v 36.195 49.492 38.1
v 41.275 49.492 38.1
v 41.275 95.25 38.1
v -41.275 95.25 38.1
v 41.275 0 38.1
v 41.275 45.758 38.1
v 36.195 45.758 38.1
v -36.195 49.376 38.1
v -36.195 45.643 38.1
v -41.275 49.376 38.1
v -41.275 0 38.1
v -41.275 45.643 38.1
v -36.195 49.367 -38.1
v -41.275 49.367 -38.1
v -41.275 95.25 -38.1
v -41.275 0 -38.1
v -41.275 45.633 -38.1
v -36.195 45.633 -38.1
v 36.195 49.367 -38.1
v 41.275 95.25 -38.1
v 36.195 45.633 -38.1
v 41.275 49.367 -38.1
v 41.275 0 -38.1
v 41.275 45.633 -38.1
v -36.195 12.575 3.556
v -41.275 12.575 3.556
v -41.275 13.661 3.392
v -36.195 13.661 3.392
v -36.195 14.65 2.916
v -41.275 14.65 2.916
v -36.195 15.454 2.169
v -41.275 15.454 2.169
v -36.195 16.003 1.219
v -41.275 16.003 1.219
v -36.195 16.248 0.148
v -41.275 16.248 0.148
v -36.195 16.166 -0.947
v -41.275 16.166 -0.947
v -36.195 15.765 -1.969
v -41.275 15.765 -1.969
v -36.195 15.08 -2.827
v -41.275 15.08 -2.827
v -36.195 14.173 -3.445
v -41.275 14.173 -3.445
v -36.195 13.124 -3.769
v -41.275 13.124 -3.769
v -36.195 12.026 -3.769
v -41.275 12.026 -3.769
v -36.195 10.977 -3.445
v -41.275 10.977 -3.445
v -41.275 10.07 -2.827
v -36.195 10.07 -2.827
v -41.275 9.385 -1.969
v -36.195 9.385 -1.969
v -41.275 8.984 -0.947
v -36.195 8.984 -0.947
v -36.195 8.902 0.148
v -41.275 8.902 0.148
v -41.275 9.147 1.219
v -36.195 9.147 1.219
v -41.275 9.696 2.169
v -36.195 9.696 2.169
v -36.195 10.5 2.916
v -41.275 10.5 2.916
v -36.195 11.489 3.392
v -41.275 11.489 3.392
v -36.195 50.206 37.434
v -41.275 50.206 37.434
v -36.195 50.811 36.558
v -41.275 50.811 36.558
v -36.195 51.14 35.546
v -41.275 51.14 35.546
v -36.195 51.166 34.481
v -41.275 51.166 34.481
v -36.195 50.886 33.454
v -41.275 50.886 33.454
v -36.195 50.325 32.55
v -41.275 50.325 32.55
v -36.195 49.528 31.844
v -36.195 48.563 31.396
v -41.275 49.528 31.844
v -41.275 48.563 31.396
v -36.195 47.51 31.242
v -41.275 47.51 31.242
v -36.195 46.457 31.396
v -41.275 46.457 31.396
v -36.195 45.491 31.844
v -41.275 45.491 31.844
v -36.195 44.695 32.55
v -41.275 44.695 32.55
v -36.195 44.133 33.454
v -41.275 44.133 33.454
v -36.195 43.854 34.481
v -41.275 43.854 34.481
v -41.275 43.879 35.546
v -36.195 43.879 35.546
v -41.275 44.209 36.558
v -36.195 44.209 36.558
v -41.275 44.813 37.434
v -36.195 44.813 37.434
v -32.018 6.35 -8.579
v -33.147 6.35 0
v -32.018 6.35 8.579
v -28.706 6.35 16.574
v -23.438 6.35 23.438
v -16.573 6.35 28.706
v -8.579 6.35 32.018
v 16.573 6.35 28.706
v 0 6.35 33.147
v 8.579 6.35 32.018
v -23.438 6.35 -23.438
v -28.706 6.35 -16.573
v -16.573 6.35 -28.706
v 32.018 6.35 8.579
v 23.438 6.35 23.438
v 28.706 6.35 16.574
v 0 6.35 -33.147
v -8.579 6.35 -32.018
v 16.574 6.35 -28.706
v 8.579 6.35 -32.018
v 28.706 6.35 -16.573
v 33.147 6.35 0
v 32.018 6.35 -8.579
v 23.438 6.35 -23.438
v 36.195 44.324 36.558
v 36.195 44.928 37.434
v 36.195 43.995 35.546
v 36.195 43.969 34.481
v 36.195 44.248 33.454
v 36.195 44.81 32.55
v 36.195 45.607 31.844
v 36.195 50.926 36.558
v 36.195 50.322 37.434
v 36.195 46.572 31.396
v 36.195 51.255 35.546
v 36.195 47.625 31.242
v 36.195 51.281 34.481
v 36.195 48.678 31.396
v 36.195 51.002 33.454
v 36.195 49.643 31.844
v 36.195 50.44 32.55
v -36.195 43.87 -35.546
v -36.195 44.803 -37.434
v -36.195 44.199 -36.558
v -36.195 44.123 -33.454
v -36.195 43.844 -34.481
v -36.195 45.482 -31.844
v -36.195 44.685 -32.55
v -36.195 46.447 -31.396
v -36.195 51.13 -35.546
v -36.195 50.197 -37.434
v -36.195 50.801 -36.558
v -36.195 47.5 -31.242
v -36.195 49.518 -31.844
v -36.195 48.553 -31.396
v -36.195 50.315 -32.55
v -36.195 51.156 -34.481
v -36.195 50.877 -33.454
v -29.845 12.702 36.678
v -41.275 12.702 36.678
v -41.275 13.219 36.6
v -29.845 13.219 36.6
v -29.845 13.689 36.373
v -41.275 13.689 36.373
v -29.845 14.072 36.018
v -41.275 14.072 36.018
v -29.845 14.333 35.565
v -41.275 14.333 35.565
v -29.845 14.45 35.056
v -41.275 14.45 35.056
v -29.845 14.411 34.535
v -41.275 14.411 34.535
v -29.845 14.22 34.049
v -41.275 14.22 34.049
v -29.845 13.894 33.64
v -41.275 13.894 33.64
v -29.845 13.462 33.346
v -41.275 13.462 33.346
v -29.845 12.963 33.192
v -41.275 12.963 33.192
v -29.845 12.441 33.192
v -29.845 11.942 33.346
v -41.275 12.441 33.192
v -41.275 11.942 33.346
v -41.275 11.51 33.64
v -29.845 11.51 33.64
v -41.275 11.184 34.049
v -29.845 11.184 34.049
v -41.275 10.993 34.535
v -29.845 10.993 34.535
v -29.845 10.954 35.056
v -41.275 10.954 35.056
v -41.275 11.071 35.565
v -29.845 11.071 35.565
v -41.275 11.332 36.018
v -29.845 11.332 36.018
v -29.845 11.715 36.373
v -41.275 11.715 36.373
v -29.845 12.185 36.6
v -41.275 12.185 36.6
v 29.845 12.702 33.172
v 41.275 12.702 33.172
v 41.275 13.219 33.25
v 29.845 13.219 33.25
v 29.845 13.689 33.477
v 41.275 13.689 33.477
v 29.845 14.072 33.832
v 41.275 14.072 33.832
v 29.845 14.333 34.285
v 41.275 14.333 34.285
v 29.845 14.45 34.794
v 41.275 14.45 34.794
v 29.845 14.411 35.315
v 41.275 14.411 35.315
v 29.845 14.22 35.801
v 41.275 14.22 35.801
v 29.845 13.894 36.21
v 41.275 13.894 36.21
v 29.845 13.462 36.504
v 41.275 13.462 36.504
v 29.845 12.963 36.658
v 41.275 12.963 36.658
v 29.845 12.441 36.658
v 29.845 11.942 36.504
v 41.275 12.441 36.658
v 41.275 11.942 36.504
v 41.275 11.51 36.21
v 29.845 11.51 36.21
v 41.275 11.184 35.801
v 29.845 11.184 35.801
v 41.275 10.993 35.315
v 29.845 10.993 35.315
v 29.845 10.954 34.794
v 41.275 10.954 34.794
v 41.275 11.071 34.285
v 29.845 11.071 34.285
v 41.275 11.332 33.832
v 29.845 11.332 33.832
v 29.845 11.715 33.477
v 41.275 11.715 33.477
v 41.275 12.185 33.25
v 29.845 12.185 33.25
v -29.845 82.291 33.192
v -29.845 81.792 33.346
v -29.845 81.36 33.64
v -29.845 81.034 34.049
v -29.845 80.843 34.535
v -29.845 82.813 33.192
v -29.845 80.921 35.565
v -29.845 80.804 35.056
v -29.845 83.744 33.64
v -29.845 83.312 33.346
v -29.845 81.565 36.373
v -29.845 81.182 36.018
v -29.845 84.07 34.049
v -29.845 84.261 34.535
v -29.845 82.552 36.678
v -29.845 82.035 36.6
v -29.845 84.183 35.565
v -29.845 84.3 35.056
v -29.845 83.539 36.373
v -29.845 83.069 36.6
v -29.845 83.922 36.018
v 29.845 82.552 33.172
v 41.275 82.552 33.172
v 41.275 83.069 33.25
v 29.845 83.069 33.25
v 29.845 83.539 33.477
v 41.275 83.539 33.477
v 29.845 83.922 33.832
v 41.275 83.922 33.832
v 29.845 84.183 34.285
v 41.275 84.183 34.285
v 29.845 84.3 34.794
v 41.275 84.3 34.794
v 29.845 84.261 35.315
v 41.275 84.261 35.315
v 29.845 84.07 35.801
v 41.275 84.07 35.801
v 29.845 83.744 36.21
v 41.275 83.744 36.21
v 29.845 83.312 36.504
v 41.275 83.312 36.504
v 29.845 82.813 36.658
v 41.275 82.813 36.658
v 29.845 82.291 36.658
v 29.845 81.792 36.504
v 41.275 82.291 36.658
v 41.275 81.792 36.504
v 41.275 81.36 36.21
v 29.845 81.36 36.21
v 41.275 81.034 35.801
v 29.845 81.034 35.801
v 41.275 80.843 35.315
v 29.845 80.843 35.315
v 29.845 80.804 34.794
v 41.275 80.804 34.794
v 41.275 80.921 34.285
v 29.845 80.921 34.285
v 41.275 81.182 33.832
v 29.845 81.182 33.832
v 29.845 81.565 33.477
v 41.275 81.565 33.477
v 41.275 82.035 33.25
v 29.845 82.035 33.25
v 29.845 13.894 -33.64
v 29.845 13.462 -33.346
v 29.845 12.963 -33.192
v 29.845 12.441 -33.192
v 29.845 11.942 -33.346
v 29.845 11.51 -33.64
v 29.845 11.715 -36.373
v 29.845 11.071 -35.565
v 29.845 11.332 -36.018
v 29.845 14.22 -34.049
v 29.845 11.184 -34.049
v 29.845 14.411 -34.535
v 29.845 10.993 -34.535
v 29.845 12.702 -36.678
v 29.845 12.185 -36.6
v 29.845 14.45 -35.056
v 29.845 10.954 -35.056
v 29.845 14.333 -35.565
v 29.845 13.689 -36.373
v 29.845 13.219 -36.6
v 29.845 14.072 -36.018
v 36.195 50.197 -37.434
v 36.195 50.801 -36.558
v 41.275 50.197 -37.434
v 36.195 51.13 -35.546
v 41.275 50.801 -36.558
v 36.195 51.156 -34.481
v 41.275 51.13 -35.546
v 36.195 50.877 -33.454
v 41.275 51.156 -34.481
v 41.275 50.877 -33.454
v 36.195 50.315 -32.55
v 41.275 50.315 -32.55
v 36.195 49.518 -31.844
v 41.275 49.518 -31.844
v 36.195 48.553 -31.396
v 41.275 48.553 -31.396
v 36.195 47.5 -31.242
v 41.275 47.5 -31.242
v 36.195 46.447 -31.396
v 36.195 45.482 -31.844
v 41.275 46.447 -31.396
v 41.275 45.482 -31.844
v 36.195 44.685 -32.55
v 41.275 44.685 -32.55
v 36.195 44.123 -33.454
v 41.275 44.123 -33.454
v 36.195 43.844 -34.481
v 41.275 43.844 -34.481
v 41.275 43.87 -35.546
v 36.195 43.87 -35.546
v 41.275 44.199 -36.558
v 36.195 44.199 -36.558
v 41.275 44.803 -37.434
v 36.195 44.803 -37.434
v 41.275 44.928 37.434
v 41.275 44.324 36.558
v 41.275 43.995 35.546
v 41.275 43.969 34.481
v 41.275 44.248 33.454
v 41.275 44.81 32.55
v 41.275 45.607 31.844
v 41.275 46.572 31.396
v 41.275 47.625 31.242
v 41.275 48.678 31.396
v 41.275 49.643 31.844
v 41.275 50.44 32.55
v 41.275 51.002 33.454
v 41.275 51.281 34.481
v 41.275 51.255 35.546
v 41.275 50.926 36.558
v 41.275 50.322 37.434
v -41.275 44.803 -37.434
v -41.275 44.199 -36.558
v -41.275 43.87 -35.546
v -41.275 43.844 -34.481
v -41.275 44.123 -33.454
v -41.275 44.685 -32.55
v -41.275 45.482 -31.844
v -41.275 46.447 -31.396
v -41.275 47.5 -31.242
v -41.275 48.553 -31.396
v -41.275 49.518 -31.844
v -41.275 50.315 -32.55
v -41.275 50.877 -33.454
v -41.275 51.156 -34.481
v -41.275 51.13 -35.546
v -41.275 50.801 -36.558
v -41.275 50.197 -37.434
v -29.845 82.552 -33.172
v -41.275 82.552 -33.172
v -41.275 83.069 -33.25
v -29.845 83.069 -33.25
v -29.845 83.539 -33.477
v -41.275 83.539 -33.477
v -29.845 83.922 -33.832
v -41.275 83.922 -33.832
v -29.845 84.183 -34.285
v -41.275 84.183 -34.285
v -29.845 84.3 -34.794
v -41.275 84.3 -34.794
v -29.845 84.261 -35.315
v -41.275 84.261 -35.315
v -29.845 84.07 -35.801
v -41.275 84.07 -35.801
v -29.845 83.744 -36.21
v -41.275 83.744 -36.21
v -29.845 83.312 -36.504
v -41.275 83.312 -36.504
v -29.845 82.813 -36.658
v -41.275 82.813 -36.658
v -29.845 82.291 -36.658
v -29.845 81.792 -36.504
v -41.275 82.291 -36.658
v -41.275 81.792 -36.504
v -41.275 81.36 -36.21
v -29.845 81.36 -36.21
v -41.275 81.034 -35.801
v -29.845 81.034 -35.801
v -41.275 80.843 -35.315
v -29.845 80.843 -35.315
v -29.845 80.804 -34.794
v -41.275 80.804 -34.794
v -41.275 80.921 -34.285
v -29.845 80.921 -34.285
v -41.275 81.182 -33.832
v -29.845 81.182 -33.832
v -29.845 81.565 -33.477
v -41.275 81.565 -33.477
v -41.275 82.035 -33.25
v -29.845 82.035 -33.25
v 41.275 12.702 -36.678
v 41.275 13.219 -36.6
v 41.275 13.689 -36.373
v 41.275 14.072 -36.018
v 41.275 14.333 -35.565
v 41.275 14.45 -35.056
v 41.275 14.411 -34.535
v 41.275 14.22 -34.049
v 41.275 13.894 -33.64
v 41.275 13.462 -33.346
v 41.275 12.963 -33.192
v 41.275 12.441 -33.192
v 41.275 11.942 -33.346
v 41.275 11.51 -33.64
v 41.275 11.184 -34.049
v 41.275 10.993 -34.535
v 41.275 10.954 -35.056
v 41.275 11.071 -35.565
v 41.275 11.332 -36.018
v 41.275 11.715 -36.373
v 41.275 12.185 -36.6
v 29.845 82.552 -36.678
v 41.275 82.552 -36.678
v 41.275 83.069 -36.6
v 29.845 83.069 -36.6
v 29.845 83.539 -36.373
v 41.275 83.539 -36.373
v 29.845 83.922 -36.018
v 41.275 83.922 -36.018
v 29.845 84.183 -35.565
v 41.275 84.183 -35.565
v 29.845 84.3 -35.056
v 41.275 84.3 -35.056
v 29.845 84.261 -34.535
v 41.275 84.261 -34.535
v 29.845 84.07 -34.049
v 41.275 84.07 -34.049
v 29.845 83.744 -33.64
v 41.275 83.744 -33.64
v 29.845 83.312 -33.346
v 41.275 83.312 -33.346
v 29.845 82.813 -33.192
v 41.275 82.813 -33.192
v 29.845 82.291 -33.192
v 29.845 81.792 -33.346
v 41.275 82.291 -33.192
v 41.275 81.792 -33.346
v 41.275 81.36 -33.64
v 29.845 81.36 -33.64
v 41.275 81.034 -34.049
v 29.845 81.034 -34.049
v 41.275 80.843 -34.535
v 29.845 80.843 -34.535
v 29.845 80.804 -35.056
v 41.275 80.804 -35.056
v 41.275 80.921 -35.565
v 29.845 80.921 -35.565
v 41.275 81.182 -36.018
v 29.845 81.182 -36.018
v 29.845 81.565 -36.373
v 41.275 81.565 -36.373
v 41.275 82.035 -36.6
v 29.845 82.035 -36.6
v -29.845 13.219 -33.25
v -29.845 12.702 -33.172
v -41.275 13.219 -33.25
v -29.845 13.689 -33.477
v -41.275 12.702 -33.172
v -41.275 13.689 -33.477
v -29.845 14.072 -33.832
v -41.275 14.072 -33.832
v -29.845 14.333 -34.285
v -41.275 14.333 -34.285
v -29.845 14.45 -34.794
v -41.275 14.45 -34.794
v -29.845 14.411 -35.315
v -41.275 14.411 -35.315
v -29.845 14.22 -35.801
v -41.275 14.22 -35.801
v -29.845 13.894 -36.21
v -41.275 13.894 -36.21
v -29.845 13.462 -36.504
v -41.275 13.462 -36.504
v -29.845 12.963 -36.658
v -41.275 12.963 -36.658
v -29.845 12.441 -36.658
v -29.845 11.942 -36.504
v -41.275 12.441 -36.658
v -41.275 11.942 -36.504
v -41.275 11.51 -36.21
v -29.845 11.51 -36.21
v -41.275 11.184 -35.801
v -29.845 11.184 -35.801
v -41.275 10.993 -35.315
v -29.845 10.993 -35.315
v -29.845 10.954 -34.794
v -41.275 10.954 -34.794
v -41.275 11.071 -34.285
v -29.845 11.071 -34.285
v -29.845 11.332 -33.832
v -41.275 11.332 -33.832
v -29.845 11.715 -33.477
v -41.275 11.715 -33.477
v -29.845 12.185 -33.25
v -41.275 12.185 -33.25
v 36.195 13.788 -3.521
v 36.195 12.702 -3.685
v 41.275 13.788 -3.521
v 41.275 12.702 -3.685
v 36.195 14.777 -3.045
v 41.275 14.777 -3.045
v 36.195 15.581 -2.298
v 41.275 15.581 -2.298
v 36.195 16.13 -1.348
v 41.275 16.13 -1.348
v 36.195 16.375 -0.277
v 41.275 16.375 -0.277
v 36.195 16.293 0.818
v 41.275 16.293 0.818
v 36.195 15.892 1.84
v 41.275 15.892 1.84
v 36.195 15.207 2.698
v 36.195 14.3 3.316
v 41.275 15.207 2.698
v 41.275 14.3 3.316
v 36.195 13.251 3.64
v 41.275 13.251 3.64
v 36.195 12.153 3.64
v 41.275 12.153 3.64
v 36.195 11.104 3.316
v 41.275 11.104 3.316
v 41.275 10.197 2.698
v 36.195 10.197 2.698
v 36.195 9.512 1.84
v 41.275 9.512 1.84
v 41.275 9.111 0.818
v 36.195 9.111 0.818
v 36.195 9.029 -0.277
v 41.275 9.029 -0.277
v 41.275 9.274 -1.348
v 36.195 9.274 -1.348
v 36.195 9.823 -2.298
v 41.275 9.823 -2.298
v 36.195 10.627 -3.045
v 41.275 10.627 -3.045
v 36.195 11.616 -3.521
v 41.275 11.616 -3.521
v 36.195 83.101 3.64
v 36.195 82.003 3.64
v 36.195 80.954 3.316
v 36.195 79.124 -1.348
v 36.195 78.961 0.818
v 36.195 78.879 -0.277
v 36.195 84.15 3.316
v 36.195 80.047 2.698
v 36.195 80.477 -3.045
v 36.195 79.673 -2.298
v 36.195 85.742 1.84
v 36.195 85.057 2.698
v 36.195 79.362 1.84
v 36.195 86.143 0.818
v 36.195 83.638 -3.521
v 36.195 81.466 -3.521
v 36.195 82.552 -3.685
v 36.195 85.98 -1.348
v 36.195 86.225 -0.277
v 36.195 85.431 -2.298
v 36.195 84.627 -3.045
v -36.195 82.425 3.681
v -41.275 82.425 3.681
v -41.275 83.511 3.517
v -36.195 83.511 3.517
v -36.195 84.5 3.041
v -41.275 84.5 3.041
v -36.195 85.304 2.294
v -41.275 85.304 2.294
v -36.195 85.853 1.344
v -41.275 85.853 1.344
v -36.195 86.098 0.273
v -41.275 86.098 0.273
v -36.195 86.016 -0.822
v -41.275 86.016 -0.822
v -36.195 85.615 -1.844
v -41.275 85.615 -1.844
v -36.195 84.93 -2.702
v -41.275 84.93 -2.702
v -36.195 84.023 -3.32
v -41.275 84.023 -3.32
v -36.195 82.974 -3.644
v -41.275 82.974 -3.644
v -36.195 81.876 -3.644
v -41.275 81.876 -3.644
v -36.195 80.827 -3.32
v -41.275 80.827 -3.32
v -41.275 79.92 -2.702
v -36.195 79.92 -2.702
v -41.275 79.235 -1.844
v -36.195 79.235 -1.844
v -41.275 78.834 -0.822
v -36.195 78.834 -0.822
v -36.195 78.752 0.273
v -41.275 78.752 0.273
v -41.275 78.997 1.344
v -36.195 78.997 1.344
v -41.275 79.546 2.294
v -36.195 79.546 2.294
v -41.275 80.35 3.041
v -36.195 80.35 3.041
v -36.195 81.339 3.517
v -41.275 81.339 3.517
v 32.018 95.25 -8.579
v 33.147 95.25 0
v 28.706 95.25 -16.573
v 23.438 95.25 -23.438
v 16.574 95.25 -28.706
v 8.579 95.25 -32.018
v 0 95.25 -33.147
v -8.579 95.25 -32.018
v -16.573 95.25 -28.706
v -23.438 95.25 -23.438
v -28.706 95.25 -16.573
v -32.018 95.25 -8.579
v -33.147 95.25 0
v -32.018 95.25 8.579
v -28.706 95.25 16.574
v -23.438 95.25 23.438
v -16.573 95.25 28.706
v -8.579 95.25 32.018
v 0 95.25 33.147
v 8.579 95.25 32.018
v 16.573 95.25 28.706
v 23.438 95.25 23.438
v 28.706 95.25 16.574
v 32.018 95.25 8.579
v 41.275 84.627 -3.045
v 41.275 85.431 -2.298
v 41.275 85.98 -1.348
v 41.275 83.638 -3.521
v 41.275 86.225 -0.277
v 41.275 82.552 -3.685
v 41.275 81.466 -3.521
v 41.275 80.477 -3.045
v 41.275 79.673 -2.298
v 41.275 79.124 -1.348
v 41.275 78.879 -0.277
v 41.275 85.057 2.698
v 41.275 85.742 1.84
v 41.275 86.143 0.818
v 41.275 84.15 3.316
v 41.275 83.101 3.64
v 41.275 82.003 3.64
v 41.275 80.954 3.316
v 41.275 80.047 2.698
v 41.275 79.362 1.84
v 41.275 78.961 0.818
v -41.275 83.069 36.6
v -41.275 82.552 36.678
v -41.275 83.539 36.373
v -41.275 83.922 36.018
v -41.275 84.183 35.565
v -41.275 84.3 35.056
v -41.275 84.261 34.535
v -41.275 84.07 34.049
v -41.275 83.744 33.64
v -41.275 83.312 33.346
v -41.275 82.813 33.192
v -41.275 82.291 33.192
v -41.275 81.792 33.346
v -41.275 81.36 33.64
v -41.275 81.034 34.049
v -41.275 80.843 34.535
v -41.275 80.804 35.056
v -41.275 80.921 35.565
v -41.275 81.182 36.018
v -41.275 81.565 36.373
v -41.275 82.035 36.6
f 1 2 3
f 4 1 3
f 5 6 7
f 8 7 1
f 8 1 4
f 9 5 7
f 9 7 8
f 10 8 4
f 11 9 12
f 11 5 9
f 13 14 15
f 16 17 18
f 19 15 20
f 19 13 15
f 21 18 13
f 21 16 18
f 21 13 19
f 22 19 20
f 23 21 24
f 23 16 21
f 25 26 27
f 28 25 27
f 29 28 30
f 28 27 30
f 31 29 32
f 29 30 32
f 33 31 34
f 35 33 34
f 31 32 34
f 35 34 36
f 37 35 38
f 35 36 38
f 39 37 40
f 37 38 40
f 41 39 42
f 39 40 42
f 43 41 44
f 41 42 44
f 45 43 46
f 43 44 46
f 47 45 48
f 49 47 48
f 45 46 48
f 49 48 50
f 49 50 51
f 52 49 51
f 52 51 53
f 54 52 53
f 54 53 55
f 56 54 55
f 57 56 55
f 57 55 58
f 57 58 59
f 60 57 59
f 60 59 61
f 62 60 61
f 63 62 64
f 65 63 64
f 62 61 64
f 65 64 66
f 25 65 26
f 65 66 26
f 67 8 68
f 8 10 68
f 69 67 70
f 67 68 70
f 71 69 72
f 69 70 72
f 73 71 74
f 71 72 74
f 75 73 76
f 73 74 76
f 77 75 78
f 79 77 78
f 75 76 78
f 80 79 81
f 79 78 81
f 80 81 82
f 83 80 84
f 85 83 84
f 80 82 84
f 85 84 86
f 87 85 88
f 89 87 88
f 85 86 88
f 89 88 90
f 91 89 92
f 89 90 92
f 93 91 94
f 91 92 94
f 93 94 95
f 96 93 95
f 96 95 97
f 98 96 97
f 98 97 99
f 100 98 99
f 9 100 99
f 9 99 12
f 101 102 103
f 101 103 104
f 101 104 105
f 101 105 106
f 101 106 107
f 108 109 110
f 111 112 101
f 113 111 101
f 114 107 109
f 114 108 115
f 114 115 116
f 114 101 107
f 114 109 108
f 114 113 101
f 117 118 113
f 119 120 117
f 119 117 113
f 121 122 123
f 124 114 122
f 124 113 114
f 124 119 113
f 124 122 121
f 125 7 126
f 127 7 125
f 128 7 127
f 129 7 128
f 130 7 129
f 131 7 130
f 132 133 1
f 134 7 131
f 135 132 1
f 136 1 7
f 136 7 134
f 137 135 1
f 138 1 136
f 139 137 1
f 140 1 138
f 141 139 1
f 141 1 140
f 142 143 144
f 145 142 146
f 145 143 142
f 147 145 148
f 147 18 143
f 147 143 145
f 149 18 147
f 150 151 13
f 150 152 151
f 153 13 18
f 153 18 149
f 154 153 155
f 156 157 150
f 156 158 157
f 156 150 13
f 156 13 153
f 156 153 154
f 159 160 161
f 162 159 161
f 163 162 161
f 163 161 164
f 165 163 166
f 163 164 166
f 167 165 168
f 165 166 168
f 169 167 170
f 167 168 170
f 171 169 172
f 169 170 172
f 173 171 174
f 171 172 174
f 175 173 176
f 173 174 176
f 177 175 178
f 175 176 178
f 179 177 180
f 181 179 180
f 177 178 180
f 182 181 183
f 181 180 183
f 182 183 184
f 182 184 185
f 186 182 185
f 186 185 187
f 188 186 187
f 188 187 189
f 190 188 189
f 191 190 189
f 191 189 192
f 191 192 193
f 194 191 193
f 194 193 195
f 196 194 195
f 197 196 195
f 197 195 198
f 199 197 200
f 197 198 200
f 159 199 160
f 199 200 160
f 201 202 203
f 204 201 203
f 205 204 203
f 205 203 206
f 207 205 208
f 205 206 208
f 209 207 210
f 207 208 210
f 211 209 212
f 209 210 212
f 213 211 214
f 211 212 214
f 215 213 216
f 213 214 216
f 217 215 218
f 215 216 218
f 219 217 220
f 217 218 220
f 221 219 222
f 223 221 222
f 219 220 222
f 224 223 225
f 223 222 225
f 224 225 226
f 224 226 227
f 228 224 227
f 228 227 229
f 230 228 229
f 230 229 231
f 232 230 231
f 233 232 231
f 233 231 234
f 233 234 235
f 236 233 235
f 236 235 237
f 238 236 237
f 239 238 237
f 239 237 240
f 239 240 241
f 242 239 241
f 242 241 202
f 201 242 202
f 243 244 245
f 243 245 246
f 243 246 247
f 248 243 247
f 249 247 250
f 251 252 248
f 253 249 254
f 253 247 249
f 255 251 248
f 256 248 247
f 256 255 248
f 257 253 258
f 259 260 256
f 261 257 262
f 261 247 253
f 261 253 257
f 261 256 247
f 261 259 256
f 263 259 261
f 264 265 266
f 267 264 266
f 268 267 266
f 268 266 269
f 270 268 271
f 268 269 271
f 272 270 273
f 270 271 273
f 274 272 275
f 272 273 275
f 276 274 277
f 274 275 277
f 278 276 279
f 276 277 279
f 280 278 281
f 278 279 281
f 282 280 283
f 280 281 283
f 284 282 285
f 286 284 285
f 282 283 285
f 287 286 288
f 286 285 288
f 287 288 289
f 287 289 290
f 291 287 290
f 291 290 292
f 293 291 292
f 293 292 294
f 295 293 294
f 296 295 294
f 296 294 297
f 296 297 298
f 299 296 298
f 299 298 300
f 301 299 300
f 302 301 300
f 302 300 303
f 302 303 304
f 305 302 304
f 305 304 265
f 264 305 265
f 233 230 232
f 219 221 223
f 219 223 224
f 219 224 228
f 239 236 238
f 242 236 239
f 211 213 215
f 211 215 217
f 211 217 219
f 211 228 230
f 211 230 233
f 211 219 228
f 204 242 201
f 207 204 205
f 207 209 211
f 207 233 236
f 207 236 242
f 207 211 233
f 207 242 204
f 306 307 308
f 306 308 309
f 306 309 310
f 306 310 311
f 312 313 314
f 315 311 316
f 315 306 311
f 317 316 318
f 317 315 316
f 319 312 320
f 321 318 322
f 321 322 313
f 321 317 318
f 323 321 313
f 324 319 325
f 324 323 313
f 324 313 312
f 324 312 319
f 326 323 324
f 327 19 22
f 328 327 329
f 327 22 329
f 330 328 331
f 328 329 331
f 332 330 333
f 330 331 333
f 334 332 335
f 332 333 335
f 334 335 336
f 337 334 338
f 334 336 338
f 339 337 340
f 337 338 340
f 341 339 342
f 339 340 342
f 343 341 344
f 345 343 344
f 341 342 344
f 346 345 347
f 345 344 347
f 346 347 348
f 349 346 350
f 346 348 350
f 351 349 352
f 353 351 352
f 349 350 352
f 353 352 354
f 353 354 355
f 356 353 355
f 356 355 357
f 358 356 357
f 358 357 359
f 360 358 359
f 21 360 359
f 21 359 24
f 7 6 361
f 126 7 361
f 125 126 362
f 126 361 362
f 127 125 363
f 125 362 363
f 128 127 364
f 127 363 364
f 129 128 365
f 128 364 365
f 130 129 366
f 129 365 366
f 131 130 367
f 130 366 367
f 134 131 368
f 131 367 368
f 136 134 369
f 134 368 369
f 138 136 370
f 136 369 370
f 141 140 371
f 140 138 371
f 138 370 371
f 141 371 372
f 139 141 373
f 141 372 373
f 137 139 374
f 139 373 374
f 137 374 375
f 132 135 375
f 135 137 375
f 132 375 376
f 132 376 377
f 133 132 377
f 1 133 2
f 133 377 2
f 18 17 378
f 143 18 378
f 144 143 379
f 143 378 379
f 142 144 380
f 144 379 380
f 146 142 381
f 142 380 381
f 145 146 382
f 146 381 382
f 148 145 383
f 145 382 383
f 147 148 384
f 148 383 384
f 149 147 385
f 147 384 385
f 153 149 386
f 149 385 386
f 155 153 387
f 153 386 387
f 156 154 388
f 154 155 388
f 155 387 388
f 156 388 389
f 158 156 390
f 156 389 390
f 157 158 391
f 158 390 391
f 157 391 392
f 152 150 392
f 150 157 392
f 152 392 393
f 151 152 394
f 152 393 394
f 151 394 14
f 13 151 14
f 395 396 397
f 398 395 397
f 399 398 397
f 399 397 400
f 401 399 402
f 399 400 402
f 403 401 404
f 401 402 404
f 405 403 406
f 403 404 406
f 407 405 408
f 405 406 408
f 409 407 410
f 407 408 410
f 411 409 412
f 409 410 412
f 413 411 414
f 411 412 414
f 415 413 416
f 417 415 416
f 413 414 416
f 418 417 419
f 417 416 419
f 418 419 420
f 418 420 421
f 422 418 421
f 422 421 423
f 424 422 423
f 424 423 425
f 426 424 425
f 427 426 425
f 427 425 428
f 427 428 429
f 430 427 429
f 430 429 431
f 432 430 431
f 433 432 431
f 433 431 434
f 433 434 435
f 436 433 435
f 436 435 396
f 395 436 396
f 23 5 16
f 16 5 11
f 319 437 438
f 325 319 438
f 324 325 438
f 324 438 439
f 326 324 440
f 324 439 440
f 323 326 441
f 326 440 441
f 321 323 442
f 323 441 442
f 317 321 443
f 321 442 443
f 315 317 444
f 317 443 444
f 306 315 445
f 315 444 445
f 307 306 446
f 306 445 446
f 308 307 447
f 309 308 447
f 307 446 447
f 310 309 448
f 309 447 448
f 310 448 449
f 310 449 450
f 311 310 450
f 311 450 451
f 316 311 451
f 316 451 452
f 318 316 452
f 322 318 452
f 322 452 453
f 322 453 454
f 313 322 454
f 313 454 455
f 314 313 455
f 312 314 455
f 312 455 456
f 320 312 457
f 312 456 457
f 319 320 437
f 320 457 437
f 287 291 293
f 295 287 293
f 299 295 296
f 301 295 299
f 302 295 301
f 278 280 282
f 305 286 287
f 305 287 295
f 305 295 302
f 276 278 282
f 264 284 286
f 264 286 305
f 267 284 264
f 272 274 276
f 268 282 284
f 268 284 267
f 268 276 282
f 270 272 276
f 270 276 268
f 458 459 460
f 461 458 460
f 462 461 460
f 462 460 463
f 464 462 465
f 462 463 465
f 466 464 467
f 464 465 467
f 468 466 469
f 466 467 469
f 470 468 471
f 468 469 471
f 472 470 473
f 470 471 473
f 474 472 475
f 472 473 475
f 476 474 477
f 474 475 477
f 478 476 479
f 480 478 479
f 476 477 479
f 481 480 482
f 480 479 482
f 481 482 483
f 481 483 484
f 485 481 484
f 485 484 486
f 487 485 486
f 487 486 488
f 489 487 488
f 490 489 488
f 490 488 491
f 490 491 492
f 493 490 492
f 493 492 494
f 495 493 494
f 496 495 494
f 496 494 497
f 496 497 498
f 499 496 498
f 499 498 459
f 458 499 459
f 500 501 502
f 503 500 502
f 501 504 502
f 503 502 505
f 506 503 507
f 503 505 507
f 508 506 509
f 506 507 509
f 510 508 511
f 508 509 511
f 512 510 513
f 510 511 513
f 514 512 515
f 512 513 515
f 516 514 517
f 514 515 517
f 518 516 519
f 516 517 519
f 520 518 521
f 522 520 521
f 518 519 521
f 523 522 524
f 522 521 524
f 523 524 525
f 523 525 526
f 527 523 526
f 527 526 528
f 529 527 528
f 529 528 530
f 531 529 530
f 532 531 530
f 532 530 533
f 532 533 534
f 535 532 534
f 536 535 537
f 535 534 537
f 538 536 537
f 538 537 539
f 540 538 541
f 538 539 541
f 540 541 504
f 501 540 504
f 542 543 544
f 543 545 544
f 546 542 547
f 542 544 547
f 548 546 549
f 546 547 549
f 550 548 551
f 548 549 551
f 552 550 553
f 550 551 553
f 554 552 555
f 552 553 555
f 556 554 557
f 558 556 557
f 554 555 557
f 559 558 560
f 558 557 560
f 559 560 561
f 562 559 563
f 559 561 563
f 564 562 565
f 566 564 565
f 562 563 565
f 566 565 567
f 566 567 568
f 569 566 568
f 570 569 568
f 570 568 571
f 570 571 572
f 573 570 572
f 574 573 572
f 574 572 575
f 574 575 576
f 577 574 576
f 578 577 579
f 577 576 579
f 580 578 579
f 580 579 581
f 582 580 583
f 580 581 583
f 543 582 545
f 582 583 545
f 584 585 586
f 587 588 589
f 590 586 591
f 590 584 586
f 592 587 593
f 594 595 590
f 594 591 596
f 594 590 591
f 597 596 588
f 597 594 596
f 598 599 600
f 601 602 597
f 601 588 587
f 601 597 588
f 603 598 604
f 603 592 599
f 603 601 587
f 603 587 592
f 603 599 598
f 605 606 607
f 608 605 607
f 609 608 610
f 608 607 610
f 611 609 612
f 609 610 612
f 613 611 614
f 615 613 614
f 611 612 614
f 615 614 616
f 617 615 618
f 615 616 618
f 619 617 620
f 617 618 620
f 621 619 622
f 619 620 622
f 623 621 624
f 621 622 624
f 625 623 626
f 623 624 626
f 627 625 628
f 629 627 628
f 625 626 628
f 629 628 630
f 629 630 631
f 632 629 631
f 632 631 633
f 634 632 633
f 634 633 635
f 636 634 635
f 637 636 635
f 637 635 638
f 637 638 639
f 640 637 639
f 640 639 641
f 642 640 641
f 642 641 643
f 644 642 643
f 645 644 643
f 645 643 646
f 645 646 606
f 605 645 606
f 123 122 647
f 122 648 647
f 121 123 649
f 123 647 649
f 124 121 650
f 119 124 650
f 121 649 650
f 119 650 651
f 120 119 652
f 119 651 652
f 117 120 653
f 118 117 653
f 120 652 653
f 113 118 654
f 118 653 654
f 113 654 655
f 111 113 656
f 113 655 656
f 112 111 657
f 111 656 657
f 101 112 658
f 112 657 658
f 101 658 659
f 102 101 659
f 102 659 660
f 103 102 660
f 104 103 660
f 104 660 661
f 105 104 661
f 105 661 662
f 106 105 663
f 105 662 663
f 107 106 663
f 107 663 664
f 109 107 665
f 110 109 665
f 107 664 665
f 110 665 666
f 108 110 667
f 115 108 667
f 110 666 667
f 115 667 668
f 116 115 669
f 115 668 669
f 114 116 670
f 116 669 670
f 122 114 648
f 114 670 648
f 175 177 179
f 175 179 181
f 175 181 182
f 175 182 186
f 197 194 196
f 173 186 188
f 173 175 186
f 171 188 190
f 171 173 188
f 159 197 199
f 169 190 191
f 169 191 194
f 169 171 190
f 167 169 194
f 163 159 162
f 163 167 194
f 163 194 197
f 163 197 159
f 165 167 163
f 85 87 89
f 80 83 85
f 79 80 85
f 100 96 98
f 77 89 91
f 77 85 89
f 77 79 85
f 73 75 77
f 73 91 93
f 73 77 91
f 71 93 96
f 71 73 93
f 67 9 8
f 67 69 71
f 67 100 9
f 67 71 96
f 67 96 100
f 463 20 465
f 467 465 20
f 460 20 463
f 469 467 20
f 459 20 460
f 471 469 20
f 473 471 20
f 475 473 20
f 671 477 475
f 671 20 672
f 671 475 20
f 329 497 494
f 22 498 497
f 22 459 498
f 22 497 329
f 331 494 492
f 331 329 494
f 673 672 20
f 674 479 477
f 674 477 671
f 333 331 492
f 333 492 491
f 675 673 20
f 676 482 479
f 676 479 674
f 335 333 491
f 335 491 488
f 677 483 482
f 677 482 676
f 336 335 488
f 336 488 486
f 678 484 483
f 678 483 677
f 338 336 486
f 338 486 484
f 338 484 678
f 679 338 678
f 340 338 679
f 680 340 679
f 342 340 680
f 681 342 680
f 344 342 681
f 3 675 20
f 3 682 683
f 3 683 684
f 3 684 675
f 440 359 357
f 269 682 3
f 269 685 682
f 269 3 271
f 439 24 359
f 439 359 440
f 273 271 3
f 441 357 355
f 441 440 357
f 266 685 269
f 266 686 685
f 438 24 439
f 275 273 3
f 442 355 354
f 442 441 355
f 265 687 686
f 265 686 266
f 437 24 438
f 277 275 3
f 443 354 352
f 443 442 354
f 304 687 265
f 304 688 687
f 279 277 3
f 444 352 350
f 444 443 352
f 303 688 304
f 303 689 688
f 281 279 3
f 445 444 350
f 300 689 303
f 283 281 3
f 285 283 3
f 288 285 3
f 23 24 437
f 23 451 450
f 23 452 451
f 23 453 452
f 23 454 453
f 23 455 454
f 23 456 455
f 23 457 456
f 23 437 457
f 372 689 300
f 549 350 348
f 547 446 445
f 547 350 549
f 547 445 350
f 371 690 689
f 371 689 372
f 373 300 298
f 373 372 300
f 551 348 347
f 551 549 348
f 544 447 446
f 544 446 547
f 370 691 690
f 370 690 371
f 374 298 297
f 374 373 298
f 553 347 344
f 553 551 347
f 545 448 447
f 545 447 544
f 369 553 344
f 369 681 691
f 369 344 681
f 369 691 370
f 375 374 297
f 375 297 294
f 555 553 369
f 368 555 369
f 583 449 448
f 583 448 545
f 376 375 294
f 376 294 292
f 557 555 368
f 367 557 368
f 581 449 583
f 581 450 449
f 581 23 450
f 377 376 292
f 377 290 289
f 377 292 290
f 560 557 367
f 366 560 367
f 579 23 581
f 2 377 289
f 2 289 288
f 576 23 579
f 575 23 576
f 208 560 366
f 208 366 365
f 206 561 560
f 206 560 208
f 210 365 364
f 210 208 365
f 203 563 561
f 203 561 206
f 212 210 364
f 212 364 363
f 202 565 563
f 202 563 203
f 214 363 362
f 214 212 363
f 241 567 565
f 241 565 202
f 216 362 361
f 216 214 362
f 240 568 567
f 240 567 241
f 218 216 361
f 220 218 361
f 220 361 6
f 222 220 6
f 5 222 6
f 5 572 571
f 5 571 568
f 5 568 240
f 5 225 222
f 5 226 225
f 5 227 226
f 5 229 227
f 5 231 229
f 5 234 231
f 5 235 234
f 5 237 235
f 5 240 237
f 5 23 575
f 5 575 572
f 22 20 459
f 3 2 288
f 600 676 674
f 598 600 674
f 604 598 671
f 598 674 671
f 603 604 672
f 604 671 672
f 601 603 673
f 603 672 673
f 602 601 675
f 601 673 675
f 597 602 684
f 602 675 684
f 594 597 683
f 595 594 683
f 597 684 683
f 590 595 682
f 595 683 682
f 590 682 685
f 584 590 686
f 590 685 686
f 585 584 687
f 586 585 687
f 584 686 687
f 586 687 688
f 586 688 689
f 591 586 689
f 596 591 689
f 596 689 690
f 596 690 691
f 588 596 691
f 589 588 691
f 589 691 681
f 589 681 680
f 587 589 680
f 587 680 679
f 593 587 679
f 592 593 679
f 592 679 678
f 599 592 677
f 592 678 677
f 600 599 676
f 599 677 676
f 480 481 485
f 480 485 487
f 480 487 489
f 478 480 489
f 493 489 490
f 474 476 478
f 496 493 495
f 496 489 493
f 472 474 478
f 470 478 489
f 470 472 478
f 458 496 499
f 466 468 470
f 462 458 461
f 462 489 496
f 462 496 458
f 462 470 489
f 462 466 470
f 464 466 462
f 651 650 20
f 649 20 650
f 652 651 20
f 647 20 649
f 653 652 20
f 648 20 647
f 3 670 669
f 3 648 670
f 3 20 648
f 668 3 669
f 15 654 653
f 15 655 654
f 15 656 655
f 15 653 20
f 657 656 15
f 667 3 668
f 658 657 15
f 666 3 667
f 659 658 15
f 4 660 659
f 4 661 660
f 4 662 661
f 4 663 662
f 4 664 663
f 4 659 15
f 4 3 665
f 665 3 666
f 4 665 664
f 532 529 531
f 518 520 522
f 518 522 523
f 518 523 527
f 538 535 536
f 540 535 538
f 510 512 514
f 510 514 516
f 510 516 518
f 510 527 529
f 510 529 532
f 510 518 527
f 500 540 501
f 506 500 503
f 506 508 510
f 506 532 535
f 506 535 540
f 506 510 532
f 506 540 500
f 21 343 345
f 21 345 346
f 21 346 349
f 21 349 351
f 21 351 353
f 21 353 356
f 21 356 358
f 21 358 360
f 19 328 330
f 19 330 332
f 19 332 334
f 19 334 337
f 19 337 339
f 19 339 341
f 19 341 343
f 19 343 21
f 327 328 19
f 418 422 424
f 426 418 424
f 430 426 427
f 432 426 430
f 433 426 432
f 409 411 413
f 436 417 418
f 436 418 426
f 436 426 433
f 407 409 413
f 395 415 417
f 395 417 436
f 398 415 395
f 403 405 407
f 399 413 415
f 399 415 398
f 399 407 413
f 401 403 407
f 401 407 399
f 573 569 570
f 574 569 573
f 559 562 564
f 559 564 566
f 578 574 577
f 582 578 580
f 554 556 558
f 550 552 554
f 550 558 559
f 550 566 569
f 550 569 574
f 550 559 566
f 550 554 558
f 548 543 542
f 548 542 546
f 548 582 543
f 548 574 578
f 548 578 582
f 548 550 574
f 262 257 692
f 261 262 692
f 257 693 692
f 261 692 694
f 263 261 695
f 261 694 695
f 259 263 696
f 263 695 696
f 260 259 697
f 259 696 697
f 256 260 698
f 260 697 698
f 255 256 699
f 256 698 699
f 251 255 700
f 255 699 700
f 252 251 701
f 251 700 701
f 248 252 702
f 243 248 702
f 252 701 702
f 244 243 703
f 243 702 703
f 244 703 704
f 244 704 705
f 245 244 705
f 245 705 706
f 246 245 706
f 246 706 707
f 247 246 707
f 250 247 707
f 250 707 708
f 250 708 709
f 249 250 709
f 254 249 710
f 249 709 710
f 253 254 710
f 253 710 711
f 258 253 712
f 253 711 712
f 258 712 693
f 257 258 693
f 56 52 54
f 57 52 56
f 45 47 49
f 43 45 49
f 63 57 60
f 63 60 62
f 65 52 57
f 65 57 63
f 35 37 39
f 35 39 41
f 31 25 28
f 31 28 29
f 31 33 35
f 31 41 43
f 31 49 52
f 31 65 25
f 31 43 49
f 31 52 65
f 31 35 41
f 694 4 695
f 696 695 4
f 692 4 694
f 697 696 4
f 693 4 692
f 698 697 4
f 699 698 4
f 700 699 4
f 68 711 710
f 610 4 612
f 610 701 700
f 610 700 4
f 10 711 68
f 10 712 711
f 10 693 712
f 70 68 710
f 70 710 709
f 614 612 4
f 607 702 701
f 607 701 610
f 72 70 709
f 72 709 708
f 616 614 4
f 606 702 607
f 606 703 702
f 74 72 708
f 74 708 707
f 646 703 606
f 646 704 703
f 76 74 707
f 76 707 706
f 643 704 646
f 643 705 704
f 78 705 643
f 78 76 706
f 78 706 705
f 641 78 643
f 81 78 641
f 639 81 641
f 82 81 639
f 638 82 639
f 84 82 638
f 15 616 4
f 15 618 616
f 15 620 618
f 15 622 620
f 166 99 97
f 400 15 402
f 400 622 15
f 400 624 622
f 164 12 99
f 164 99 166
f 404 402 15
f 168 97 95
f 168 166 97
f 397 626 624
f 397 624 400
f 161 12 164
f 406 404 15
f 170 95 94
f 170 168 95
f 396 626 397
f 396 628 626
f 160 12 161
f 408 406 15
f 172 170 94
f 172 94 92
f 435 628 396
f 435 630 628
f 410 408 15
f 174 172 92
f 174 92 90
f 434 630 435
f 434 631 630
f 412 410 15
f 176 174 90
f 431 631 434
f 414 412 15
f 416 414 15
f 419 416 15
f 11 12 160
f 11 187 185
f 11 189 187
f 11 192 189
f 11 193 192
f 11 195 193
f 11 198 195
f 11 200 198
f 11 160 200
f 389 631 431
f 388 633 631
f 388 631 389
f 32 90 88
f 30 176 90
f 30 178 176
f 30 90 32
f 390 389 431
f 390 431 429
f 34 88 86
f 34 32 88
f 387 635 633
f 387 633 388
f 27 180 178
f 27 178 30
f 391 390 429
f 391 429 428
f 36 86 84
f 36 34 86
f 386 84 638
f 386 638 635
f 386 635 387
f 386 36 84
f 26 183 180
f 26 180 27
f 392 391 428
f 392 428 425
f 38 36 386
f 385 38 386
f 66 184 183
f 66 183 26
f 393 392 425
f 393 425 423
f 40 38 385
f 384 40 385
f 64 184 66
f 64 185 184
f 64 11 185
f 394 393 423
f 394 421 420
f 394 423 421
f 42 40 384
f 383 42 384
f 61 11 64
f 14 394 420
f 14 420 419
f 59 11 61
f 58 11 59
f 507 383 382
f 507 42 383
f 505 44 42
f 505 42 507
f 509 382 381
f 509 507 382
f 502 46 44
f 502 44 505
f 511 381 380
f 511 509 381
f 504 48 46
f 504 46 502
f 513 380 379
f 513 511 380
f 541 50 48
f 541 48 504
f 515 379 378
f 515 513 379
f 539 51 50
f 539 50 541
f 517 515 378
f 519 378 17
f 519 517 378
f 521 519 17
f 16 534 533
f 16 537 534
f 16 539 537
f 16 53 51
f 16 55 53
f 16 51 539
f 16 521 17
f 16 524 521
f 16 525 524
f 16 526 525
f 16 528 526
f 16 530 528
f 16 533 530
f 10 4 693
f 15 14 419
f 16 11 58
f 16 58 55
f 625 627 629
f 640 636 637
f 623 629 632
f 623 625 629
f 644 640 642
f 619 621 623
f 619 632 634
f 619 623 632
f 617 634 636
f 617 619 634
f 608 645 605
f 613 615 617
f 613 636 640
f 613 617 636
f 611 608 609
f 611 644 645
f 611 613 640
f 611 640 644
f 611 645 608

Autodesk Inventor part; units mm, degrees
ref_plane "YZ Plane" through (0, 0, 0) normal (1, 0, 0) x (0, 1, 0)
ref_plane "XZ Plane" through (0, 0, 0) normal (0, 1, 0) x (-1, 0, 0)
ref_plane "XY Plane" through (0, 0, 0) normal (0, 0, 1) x (1, 0, 0)
sketch "Sketch1" plane through (0, 0, 0) normal (0, 1, 0) x (-1, 0, 0)
  line L0 (41.275, -38.1) -> (-41.275, -38.1)
  line L1 (-41.275, -38.1) -> (-41.275, 38.1)
  line L2 (-41.275, 38.1) -> (41.275, 38.1)
  line L3 (41.275, 38.1) -> (41.275, -38.1)
  circle A0 centre (0, 0) radius 4.5409
  dimension "d3" = 82.55
  dimension "d4" = 76.2
extrude "block" add sketch "Sketch1" along normal blind 95.25 contours L0 L1 L2 L3 | A0
sketch "Sketch2" plane through (0, 95.25, 0) normal (0, 1, 0) x (1, 0, 0)
  circle A0 centre (0, 0) radius 33.147
  dimension "d7" = 66.294
extrude "hole" cut sketch "Sketch2" against normal blind 88.9
sketch "Sketch4" plane through (41.275, 0, 38.1) normal (1, 0, 0) x (0, 0, -1)
  line L0 (76.2, 85.6) -> (76.2, 9.4)
  line L1 (0, 9.4) -> (0, 85.6)
  line L2 (38.227, 85.727) -> (38.102, 85.727)
  line L3 (0, 0) -> (0, 95.25) projected
  line L4 (0, 47.625) -> (0, 47.375)
  line L5 (76.2, 0) -> (76.2, 95.25) projected
  line L6 (76.2, 47.625) -> (76.2, 47.5)
  line L7 (8.3242, 59.8735) -> (8.4492, 59.8735)
  line L8 (38.102, 85.727) -> (38.102, 82.552)
  circle A0 centre (38.102, 82.552) radius 3.683
  circle A1 centre (3.175, 47.625) radius 3.683
  circle A2 centre (38.102, 12.702) radius 3.683
  circle A3 centre (73.025, 47.5) radius 3.683
  line L9 (0, 47.625) -> (3.175, 47.625)
  line L10 (38.102, 82.425) -> (38.102, -13.1059)
  line L11 (3.175, 47.625) -> (115.5999, 47.625)
  circle A4 centre (73.025, 47.625) radius 0.0045
  point P0 (38.1, 0)
  dimension "d10" = 76.2
  dimension "d11" = 76.2
  dimension "d21" = 3.175
  dimension "d30" = 7.366
  dimension "d32" = 7.366
  dimension "d33" = 7.366
  dimension "d34" = 7.366
  dimension "d35" = 3.175
extrude "Extrusion3" cut sketch "Sketch4" against normal blind 5.08
sketch "Sketch5" plane through (-41.275, 0, -38.1) normal (-1, 0, 0) x (0, 0, 1)
  line L0 (0, 85.6) -> (76.2, 85.6)
  line L1 (76.2, 85.6) -> (76.2, 9.4)
  line L2 (76.2, 9.4) -> (0, 9.4)
  line L3 (0, 9.4) -> (0, 85.6)
  line L4 (38.1, 85.6) -> (37.975, 85.6)
  line L5 (38.1, 9.4) -> (38.225, 9.4)
  line L6 (0, 0) -> (0, 95)
  line L7 (0, 47.5) -> (0, 47.375)
  line L8 (76.2, 0) -> (76.2, 95)
  line L9 (76.2, 47.5) -> (76.2, 47.375)
  line L10 (8.3242, 59.8735) -> (8.4492, 59.8735)
  line L11 (0, 47.375) -> (3.175, 47.375)
  line L12 (37.975, 85.6) -> (37.975, 82.425)
  line L13 (76.2, 47.375) -> (73.025, 47.375)
  line L14 (38.225, 9.4) -> (38.225, 12.575)
  circle A0 centre (3.175, 82.552) radius 1.7526
  circle A1 centre (73.025, 12.702) radius 1.7526
  circle A2 centre (3.175, 12.702) radius 1.7526
  circle A3 centre (73.025, 82.552) radius 1.7526
  point P0 (38.1, 0)
  point P1 (38.1, 0)
  dimension "d24" = 76.2
  dimension "d25" = 76.2
  dimension "d26" = 3.175
  dimension "d27" = 3.175
  dimension "d28" = 3.175
  dimension "d29" = 3.175
  dimension "d38" = 3.5052
  dimension "d39" = 3.5052
  dimension "d40" = 3.5052
  dimension "d41" = 3.5052
extrude "Extrusion4" cut sketch "Sketch5" against normal blind 11.43 contours A0 | A1 | A2 | A3
sketch "Sketch6" plane through (-41.275, 0, -38.1) normal (-1, 0, 0) x (0, 0, 1)
  circle A0 centre (38.098, 82.425) radius 3.683
  circle A1 centre (38.098, 82.425) radius 3.683
  circle A2 centre (3.175, 47.5) radius 3.683
  circle A3 centre (37.973, 12.575) radius 3.683
  circle A4 centre (37.973, 12.575) radius 3.683
  arc A5 (76.2, 49.3763) -> (76.2, 45.6433) centre (73.025, 47.5098) ccw
  circle A6 centre (73.025, 47.5098) radius 3.683
  line L0 (76.2, 95.0156) -> (0, 95.0156)
  line L1 (0, 0.0156) -> (0, 45.6334)
  line L2 (76.2, 0.0156) -> (76.2, 95.0156)
  line L3 (4.85, 95) -> (71.35, 95)
  line L4 (0, 0.0156) -> (76.2, 0.0156)
  arc A7 (0, 45.6334) -> (0, 49.3666) centre (3.175, 47.5) ccw projected
  point P0 (38.1, 0)
  point P1 (0, 95.0156)
extrude "Extrusion5" cut sketch "Sketch6" against normal blind 5.08
sketch "Sketch9" plane through (41.275, 0, 38.1) normal (1, 0, 0) x (0, 0, -1)
  circle A0 centre (3.175, 82.552) radius 1.7526 projected
  circle A1 centre (3.175, 82.552) radius 1.7526
  circle A2 centre (3.175, 12.702) radius 1.7526 projected
  circle A3 centre (3.175, 12.702) radius 1.7526
  circle A4 centre (73.025, 12.702) radius 1.7526 projected
  circle A5 centre (73.025, 12.702) radius 1.7526
  circle A6 centre (73.025, 82.552) radius 1.7526 projected
  circle A7 centre (73.025, 82.552) radius 1.7526
  point P0 (38.1, 0)
extrude "Extrusion6" cut sketch "Sketch9" against normal blind 11.43
properties part number "mid_block"
